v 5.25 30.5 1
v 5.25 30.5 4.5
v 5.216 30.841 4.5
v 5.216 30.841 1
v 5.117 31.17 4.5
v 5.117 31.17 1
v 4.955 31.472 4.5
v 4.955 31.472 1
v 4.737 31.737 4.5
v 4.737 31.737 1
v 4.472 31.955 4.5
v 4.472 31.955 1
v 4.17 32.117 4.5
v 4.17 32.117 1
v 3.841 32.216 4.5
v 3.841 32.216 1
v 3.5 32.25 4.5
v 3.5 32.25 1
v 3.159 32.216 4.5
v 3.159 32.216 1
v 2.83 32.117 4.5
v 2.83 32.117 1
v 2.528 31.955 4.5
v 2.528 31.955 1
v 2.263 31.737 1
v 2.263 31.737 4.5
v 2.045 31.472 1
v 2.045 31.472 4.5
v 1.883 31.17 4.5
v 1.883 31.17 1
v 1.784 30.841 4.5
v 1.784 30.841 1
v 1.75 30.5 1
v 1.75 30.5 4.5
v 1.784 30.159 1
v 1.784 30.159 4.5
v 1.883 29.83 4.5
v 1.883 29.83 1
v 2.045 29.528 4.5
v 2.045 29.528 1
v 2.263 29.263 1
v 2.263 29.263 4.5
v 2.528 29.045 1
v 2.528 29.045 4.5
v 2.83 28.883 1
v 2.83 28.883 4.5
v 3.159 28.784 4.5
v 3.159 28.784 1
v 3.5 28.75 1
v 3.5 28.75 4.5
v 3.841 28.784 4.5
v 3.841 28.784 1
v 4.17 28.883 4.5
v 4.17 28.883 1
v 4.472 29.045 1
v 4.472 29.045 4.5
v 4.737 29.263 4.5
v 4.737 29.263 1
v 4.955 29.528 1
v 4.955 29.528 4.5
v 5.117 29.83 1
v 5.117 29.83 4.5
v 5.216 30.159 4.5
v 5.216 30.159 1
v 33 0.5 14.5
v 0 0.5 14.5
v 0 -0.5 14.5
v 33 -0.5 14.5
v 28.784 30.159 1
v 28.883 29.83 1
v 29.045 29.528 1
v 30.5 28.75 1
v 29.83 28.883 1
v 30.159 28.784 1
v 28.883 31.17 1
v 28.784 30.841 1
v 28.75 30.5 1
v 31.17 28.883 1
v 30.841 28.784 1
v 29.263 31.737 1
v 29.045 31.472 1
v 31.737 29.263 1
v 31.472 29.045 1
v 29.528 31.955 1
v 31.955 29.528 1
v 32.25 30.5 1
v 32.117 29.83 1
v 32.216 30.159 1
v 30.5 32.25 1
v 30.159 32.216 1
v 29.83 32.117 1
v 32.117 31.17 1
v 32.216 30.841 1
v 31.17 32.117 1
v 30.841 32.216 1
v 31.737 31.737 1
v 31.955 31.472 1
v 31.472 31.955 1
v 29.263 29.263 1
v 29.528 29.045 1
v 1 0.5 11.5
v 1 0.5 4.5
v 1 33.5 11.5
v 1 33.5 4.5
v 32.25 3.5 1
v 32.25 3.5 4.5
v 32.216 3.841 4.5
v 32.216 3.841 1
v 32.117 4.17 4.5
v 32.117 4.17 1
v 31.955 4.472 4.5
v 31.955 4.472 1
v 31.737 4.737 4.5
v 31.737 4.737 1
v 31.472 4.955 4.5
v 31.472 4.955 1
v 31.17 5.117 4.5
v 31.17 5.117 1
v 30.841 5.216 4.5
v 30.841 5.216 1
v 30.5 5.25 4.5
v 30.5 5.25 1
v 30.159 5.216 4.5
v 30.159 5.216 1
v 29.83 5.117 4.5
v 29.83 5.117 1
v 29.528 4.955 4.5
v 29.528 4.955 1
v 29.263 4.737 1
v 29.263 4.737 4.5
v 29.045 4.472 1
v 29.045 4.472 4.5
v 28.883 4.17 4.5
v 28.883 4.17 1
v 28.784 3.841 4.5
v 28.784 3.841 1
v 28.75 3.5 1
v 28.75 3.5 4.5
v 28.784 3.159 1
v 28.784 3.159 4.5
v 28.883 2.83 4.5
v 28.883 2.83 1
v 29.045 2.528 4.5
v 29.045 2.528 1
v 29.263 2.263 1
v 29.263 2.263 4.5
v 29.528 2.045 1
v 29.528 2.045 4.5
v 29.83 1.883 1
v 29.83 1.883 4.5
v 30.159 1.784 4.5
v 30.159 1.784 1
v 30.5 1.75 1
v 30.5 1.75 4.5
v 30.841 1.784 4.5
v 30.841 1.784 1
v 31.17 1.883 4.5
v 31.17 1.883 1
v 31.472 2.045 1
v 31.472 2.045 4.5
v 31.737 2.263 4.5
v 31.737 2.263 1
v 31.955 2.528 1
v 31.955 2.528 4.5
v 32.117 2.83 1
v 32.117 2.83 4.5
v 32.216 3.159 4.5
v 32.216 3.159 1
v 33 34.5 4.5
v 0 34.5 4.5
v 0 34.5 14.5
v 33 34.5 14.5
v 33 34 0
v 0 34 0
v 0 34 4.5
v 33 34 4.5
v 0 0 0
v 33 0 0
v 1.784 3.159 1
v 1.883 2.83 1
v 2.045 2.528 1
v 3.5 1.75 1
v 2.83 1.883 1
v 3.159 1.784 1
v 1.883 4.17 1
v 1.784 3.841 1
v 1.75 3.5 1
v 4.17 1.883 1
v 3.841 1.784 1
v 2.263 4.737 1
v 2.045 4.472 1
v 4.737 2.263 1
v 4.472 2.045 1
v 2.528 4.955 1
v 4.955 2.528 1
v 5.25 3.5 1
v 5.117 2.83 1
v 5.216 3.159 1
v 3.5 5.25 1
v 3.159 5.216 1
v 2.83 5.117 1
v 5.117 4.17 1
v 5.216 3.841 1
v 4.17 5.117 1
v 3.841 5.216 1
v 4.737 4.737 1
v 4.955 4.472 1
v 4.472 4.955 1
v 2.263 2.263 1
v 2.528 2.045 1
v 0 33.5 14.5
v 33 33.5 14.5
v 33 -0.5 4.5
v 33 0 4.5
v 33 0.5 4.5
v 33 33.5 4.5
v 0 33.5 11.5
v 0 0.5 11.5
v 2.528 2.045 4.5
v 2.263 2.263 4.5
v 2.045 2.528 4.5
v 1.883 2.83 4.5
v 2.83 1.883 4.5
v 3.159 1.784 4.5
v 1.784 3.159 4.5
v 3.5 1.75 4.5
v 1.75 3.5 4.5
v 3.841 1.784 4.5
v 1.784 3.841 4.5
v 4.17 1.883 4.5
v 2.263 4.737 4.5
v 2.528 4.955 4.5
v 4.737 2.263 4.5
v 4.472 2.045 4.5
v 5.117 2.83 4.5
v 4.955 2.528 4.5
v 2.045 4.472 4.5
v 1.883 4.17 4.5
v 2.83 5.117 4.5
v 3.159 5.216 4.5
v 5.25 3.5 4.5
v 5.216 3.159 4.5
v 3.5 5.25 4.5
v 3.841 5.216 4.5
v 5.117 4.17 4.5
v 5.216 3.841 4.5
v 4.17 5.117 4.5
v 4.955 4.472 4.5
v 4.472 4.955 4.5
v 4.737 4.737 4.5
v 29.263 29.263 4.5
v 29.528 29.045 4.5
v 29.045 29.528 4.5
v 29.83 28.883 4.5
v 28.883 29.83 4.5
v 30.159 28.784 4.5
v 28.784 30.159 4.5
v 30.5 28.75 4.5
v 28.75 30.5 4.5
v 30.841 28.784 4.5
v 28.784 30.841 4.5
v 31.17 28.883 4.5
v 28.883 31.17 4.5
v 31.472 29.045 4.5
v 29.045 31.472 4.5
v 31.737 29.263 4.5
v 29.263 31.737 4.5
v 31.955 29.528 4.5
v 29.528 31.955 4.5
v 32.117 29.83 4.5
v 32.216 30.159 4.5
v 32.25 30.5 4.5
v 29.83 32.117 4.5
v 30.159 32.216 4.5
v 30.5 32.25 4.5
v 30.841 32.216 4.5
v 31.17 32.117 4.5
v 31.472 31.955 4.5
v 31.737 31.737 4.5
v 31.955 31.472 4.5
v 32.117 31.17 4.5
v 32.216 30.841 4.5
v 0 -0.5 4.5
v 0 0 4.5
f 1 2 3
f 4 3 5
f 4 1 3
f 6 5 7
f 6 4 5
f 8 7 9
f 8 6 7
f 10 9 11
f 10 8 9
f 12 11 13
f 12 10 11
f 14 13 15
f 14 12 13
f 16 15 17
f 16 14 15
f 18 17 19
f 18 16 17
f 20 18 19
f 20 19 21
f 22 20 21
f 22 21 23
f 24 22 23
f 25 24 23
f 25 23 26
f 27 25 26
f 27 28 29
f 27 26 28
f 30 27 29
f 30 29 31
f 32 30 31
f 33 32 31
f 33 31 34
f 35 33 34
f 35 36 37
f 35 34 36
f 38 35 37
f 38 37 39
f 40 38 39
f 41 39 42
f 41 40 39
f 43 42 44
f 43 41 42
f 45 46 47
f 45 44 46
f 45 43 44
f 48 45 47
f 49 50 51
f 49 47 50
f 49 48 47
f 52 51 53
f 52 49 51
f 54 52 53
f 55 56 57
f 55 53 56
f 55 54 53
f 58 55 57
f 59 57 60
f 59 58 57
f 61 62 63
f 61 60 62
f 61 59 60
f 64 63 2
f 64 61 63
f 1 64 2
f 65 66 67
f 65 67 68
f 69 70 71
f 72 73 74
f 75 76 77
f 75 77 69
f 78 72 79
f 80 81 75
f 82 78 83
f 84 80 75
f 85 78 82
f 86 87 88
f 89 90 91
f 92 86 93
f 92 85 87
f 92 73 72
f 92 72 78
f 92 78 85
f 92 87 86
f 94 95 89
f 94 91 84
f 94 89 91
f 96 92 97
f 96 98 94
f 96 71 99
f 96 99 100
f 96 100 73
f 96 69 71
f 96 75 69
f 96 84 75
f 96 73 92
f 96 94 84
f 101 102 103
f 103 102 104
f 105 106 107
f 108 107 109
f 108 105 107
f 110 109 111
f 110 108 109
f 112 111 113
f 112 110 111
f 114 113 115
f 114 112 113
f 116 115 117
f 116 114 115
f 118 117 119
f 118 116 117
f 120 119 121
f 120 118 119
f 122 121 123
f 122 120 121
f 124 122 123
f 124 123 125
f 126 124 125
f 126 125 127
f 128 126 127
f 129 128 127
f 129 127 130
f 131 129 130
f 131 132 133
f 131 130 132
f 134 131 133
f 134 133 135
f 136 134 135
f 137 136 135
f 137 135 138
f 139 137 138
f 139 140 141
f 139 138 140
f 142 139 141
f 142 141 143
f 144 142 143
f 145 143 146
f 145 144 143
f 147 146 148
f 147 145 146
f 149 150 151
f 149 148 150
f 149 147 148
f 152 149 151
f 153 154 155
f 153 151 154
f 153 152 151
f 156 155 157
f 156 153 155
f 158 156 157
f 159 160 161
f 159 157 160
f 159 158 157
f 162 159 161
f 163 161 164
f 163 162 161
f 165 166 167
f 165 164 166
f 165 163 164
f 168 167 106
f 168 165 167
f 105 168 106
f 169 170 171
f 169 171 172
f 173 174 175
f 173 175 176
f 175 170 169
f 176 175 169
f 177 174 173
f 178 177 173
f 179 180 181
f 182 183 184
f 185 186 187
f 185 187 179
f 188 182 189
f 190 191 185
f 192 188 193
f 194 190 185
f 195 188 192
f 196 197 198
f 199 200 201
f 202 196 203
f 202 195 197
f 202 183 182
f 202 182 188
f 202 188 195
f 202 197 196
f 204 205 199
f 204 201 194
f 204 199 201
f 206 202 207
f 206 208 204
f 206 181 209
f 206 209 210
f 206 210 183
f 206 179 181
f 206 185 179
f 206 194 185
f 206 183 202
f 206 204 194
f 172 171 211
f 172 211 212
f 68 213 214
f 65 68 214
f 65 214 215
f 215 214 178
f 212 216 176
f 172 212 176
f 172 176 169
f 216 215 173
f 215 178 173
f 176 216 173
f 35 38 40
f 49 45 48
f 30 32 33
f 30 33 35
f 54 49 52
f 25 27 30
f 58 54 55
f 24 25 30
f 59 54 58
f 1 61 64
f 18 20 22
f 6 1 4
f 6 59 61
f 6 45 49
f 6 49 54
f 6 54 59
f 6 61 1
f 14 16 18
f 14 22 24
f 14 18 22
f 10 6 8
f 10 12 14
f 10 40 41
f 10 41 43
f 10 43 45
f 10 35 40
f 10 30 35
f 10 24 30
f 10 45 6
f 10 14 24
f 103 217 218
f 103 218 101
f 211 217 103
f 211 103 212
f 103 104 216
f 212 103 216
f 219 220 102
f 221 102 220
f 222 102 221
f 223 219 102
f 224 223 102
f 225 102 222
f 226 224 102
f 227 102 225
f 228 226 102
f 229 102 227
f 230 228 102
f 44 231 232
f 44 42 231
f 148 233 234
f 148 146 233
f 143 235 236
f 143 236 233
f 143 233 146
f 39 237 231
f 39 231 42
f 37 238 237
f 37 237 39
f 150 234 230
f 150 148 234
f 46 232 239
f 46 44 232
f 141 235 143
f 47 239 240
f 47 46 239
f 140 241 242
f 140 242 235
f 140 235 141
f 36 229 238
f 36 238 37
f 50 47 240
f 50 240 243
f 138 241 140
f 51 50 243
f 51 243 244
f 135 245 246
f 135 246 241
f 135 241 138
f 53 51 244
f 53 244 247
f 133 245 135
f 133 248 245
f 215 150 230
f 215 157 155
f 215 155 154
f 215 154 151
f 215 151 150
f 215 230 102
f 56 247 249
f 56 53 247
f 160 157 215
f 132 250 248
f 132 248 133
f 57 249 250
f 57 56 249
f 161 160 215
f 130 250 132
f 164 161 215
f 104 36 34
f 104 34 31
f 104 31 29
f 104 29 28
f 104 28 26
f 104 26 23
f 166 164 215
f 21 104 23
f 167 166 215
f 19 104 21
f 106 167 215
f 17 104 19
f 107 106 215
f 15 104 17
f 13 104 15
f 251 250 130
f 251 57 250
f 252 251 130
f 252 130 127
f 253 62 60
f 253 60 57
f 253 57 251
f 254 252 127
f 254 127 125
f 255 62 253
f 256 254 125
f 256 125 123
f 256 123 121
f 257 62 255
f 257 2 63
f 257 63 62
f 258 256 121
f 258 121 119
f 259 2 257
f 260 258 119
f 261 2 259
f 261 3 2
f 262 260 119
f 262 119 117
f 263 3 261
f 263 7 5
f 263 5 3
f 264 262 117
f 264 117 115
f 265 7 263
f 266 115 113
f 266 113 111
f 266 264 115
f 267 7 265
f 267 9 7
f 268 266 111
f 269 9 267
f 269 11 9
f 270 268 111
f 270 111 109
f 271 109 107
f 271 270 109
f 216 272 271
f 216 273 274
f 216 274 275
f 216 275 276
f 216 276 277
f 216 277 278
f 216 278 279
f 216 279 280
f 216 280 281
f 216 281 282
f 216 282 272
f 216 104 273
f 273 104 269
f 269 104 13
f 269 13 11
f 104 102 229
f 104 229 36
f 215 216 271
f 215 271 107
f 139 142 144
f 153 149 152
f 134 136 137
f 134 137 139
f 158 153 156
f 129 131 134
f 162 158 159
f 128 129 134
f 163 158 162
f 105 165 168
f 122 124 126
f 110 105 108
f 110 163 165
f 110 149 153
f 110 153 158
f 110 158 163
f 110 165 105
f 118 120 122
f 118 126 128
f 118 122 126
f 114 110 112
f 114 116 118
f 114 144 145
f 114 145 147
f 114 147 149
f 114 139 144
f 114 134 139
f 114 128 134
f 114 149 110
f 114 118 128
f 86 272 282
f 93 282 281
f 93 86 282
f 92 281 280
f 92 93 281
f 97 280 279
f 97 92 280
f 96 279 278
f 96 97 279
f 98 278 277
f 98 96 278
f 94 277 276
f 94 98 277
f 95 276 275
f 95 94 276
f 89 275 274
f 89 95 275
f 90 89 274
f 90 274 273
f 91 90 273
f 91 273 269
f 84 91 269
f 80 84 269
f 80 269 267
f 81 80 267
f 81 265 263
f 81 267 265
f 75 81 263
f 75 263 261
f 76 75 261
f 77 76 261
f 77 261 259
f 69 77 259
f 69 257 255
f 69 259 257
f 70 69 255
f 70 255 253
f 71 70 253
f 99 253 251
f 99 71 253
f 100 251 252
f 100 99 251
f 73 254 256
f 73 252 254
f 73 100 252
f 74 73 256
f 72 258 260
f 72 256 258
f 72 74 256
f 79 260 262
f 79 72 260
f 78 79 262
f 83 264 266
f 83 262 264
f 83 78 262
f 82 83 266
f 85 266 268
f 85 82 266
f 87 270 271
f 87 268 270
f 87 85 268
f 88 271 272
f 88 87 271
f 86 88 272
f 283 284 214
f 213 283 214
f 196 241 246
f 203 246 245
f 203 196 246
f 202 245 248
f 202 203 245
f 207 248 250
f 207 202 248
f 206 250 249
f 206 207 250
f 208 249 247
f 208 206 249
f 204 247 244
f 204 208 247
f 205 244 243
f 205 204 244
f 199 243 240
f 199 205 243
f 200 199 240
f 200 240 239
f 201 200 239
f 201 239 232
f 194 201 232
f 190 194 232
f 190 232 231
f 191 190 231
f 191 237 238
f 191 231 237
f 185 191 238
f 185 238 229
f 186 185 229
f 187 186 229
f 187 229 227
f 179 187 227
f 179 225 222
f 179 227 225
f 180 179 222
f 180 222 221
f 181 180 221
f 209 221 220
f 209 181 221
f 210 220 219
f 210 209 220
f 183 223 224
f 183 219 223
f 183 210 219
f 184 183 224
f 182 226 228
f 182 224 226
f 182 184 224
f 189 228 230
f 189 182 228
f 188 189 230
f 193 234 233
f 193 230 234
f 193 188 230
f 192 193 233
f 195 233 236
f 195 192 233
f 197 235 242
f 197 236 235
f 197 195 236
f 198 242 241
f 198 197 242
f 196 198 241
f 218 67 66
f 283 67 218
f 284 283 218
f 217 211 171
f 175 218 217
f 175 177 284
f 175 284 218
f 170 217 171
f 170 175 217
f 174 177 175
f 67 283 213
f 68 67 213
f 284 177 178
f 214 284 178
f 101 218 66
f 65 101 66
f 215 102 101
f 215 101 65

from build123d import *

# Parameters (mm, degrees)
BOX002_W          = 33
BOX002_H          = 1
BOX002_DEPTH      = 10
BOX001_W          = 1
BOX001_H          = 34
BOX001_DEPTH      = 7
BOX003_W          = 33
BOX003_H          = 1
BOX003_DEPTH      = 10
BOX004_W          = 33
BOX004_H          = 1
BOX004_DEPTH      = 10
CYLINDER_R        = 1.75
CYLINDER_DEPTH    = 4.5
CYLINDER001_R     = 1.75
CYLINDER001_DEPTH = 4.5
CYLINDER003_R     = 1.75
CYLINDER003_DEPTH = 4.5
CYLINDER002_R     = 1.75
CYLINDER002_DEPTH = 4.5
BOX_W             = 33
BOX_H             = 34
BOX_DEPTH         = 4.5


with BuildPart() as body006:
    # Box002 → Box002 (join)
    with BuildSketch(Plane(origin=(0, -0.5, 4.5), x_dir=(1, 0, 0), z_dir=(0, 0, 1))):
        with Locations((16.5, 0.5)):
            Rectangle(BOX002_W, BOX002_H)
    extrude(amount=BOX002_DEPTH)


with BuildPart() as body005:
    # Box001 → Box001 (join)
    with BuildSketch(Plane(origin=(0, -0.5, 4.5), x_dir=(1, 0, 0), z_dir=(0, 0, 1))):
        with Locations((0.5, 17)):
            Rectangle(BOX001_W, BOX001_H)
    extrude(amount=BOX001_DEPTH)


with BuildPart() as body007:
    # Box003 → Box003 (join)
    with BuildSketch(Plane(origin=(0, 33.5, 4.5), x_dir=(1, 0, 0), z_dir=(0, 0, 1))):
        with Locations((16.5, 0.5)):
            Rectangle(BOX003_W, BOX003_H)
    extrude(amount=BOX003_DEPTH)


with BuildPart() as body008:
    # Box004 → Box004 (join)
    with BuildSketch(Plane(origin=(0, -0.5, 4.5), x_dir=(1, 0, 0), z_dir=(0, 0, 1))):
        with Locations((16.5, 0.5)):
            Rectangle(BOX004_W, BOX004_H)
    extrude(amount=BOX004_DEPTH)


with BuildPart() as hole3:
    # Cylinder → Cylinder (join)
    with BuildSketch(Plane(origin=(3.5, 3.5, 1), x_dir=(1, 0, 0), z_dir=(0, 0, 1))):
        Circle(CYLINDER_R)
    extrude(amount=CYLINDER_DEPTH)


with BuildPart() as hole1:
    # Cylinder001 → Cylinder001 (join)
    with BuildSketch(Plane(origin=(3.5, 30.5, 1), x_dir=(1, 0, 0), z_dir=(0, 0, 1))):
        Circle(CYLINDER001_R)
    extrude(amount=CYLINDER001_DEPTH)


with BuildPart() as hole2:
    # Cylinder003 → Cylinder003 (join)
    with BuildSketch(Plane(origin=(30.5, 30.5, 1), x_dir=(1, 0, 0), z_dir=(0, 0, 1))):
        Circle(CYLINDER003_R)
    extrude(amount=CYLINDER003_DEPTH)


with BuildPart() as hole4:
    # Cylinder002 → Cylinder002 (join)
    with BuildSketch(Plane(origin=(30.5, 3.5, 1), x_dir=(1, 0, 0), z_dir=(0, 0, 1))):
        Circle(CYLINDER002_R)
    extrude(amount=CYLINDER002_DEPTH)


with BuildPart() as base:
    # Box → Box (join)
    with BuildSketch(Plane.XY):
        with Locations((16.5, 17)):
            Rectangle(BOX_W, BOX_H)
    extrude(amount=BOX_DEPTH)

    # Boolean: union Body006, Body005, Body007, Body008
    add(body006.part)
    add(body005.part)
    add(body007.part)
    add(body008.part)

    # Boolean001: cut hole3, hole1, hole2, hole4
    add(hole3.part, mode=Mode.SUBTRACT)
    add(hole1.part, mode=Mode.SUBTRACT)
    add(hole2.part, mode=Mode.SUBTRACT)
    add(hole4.part, mode=Mode.SUBTRACT)


solid = base.part
